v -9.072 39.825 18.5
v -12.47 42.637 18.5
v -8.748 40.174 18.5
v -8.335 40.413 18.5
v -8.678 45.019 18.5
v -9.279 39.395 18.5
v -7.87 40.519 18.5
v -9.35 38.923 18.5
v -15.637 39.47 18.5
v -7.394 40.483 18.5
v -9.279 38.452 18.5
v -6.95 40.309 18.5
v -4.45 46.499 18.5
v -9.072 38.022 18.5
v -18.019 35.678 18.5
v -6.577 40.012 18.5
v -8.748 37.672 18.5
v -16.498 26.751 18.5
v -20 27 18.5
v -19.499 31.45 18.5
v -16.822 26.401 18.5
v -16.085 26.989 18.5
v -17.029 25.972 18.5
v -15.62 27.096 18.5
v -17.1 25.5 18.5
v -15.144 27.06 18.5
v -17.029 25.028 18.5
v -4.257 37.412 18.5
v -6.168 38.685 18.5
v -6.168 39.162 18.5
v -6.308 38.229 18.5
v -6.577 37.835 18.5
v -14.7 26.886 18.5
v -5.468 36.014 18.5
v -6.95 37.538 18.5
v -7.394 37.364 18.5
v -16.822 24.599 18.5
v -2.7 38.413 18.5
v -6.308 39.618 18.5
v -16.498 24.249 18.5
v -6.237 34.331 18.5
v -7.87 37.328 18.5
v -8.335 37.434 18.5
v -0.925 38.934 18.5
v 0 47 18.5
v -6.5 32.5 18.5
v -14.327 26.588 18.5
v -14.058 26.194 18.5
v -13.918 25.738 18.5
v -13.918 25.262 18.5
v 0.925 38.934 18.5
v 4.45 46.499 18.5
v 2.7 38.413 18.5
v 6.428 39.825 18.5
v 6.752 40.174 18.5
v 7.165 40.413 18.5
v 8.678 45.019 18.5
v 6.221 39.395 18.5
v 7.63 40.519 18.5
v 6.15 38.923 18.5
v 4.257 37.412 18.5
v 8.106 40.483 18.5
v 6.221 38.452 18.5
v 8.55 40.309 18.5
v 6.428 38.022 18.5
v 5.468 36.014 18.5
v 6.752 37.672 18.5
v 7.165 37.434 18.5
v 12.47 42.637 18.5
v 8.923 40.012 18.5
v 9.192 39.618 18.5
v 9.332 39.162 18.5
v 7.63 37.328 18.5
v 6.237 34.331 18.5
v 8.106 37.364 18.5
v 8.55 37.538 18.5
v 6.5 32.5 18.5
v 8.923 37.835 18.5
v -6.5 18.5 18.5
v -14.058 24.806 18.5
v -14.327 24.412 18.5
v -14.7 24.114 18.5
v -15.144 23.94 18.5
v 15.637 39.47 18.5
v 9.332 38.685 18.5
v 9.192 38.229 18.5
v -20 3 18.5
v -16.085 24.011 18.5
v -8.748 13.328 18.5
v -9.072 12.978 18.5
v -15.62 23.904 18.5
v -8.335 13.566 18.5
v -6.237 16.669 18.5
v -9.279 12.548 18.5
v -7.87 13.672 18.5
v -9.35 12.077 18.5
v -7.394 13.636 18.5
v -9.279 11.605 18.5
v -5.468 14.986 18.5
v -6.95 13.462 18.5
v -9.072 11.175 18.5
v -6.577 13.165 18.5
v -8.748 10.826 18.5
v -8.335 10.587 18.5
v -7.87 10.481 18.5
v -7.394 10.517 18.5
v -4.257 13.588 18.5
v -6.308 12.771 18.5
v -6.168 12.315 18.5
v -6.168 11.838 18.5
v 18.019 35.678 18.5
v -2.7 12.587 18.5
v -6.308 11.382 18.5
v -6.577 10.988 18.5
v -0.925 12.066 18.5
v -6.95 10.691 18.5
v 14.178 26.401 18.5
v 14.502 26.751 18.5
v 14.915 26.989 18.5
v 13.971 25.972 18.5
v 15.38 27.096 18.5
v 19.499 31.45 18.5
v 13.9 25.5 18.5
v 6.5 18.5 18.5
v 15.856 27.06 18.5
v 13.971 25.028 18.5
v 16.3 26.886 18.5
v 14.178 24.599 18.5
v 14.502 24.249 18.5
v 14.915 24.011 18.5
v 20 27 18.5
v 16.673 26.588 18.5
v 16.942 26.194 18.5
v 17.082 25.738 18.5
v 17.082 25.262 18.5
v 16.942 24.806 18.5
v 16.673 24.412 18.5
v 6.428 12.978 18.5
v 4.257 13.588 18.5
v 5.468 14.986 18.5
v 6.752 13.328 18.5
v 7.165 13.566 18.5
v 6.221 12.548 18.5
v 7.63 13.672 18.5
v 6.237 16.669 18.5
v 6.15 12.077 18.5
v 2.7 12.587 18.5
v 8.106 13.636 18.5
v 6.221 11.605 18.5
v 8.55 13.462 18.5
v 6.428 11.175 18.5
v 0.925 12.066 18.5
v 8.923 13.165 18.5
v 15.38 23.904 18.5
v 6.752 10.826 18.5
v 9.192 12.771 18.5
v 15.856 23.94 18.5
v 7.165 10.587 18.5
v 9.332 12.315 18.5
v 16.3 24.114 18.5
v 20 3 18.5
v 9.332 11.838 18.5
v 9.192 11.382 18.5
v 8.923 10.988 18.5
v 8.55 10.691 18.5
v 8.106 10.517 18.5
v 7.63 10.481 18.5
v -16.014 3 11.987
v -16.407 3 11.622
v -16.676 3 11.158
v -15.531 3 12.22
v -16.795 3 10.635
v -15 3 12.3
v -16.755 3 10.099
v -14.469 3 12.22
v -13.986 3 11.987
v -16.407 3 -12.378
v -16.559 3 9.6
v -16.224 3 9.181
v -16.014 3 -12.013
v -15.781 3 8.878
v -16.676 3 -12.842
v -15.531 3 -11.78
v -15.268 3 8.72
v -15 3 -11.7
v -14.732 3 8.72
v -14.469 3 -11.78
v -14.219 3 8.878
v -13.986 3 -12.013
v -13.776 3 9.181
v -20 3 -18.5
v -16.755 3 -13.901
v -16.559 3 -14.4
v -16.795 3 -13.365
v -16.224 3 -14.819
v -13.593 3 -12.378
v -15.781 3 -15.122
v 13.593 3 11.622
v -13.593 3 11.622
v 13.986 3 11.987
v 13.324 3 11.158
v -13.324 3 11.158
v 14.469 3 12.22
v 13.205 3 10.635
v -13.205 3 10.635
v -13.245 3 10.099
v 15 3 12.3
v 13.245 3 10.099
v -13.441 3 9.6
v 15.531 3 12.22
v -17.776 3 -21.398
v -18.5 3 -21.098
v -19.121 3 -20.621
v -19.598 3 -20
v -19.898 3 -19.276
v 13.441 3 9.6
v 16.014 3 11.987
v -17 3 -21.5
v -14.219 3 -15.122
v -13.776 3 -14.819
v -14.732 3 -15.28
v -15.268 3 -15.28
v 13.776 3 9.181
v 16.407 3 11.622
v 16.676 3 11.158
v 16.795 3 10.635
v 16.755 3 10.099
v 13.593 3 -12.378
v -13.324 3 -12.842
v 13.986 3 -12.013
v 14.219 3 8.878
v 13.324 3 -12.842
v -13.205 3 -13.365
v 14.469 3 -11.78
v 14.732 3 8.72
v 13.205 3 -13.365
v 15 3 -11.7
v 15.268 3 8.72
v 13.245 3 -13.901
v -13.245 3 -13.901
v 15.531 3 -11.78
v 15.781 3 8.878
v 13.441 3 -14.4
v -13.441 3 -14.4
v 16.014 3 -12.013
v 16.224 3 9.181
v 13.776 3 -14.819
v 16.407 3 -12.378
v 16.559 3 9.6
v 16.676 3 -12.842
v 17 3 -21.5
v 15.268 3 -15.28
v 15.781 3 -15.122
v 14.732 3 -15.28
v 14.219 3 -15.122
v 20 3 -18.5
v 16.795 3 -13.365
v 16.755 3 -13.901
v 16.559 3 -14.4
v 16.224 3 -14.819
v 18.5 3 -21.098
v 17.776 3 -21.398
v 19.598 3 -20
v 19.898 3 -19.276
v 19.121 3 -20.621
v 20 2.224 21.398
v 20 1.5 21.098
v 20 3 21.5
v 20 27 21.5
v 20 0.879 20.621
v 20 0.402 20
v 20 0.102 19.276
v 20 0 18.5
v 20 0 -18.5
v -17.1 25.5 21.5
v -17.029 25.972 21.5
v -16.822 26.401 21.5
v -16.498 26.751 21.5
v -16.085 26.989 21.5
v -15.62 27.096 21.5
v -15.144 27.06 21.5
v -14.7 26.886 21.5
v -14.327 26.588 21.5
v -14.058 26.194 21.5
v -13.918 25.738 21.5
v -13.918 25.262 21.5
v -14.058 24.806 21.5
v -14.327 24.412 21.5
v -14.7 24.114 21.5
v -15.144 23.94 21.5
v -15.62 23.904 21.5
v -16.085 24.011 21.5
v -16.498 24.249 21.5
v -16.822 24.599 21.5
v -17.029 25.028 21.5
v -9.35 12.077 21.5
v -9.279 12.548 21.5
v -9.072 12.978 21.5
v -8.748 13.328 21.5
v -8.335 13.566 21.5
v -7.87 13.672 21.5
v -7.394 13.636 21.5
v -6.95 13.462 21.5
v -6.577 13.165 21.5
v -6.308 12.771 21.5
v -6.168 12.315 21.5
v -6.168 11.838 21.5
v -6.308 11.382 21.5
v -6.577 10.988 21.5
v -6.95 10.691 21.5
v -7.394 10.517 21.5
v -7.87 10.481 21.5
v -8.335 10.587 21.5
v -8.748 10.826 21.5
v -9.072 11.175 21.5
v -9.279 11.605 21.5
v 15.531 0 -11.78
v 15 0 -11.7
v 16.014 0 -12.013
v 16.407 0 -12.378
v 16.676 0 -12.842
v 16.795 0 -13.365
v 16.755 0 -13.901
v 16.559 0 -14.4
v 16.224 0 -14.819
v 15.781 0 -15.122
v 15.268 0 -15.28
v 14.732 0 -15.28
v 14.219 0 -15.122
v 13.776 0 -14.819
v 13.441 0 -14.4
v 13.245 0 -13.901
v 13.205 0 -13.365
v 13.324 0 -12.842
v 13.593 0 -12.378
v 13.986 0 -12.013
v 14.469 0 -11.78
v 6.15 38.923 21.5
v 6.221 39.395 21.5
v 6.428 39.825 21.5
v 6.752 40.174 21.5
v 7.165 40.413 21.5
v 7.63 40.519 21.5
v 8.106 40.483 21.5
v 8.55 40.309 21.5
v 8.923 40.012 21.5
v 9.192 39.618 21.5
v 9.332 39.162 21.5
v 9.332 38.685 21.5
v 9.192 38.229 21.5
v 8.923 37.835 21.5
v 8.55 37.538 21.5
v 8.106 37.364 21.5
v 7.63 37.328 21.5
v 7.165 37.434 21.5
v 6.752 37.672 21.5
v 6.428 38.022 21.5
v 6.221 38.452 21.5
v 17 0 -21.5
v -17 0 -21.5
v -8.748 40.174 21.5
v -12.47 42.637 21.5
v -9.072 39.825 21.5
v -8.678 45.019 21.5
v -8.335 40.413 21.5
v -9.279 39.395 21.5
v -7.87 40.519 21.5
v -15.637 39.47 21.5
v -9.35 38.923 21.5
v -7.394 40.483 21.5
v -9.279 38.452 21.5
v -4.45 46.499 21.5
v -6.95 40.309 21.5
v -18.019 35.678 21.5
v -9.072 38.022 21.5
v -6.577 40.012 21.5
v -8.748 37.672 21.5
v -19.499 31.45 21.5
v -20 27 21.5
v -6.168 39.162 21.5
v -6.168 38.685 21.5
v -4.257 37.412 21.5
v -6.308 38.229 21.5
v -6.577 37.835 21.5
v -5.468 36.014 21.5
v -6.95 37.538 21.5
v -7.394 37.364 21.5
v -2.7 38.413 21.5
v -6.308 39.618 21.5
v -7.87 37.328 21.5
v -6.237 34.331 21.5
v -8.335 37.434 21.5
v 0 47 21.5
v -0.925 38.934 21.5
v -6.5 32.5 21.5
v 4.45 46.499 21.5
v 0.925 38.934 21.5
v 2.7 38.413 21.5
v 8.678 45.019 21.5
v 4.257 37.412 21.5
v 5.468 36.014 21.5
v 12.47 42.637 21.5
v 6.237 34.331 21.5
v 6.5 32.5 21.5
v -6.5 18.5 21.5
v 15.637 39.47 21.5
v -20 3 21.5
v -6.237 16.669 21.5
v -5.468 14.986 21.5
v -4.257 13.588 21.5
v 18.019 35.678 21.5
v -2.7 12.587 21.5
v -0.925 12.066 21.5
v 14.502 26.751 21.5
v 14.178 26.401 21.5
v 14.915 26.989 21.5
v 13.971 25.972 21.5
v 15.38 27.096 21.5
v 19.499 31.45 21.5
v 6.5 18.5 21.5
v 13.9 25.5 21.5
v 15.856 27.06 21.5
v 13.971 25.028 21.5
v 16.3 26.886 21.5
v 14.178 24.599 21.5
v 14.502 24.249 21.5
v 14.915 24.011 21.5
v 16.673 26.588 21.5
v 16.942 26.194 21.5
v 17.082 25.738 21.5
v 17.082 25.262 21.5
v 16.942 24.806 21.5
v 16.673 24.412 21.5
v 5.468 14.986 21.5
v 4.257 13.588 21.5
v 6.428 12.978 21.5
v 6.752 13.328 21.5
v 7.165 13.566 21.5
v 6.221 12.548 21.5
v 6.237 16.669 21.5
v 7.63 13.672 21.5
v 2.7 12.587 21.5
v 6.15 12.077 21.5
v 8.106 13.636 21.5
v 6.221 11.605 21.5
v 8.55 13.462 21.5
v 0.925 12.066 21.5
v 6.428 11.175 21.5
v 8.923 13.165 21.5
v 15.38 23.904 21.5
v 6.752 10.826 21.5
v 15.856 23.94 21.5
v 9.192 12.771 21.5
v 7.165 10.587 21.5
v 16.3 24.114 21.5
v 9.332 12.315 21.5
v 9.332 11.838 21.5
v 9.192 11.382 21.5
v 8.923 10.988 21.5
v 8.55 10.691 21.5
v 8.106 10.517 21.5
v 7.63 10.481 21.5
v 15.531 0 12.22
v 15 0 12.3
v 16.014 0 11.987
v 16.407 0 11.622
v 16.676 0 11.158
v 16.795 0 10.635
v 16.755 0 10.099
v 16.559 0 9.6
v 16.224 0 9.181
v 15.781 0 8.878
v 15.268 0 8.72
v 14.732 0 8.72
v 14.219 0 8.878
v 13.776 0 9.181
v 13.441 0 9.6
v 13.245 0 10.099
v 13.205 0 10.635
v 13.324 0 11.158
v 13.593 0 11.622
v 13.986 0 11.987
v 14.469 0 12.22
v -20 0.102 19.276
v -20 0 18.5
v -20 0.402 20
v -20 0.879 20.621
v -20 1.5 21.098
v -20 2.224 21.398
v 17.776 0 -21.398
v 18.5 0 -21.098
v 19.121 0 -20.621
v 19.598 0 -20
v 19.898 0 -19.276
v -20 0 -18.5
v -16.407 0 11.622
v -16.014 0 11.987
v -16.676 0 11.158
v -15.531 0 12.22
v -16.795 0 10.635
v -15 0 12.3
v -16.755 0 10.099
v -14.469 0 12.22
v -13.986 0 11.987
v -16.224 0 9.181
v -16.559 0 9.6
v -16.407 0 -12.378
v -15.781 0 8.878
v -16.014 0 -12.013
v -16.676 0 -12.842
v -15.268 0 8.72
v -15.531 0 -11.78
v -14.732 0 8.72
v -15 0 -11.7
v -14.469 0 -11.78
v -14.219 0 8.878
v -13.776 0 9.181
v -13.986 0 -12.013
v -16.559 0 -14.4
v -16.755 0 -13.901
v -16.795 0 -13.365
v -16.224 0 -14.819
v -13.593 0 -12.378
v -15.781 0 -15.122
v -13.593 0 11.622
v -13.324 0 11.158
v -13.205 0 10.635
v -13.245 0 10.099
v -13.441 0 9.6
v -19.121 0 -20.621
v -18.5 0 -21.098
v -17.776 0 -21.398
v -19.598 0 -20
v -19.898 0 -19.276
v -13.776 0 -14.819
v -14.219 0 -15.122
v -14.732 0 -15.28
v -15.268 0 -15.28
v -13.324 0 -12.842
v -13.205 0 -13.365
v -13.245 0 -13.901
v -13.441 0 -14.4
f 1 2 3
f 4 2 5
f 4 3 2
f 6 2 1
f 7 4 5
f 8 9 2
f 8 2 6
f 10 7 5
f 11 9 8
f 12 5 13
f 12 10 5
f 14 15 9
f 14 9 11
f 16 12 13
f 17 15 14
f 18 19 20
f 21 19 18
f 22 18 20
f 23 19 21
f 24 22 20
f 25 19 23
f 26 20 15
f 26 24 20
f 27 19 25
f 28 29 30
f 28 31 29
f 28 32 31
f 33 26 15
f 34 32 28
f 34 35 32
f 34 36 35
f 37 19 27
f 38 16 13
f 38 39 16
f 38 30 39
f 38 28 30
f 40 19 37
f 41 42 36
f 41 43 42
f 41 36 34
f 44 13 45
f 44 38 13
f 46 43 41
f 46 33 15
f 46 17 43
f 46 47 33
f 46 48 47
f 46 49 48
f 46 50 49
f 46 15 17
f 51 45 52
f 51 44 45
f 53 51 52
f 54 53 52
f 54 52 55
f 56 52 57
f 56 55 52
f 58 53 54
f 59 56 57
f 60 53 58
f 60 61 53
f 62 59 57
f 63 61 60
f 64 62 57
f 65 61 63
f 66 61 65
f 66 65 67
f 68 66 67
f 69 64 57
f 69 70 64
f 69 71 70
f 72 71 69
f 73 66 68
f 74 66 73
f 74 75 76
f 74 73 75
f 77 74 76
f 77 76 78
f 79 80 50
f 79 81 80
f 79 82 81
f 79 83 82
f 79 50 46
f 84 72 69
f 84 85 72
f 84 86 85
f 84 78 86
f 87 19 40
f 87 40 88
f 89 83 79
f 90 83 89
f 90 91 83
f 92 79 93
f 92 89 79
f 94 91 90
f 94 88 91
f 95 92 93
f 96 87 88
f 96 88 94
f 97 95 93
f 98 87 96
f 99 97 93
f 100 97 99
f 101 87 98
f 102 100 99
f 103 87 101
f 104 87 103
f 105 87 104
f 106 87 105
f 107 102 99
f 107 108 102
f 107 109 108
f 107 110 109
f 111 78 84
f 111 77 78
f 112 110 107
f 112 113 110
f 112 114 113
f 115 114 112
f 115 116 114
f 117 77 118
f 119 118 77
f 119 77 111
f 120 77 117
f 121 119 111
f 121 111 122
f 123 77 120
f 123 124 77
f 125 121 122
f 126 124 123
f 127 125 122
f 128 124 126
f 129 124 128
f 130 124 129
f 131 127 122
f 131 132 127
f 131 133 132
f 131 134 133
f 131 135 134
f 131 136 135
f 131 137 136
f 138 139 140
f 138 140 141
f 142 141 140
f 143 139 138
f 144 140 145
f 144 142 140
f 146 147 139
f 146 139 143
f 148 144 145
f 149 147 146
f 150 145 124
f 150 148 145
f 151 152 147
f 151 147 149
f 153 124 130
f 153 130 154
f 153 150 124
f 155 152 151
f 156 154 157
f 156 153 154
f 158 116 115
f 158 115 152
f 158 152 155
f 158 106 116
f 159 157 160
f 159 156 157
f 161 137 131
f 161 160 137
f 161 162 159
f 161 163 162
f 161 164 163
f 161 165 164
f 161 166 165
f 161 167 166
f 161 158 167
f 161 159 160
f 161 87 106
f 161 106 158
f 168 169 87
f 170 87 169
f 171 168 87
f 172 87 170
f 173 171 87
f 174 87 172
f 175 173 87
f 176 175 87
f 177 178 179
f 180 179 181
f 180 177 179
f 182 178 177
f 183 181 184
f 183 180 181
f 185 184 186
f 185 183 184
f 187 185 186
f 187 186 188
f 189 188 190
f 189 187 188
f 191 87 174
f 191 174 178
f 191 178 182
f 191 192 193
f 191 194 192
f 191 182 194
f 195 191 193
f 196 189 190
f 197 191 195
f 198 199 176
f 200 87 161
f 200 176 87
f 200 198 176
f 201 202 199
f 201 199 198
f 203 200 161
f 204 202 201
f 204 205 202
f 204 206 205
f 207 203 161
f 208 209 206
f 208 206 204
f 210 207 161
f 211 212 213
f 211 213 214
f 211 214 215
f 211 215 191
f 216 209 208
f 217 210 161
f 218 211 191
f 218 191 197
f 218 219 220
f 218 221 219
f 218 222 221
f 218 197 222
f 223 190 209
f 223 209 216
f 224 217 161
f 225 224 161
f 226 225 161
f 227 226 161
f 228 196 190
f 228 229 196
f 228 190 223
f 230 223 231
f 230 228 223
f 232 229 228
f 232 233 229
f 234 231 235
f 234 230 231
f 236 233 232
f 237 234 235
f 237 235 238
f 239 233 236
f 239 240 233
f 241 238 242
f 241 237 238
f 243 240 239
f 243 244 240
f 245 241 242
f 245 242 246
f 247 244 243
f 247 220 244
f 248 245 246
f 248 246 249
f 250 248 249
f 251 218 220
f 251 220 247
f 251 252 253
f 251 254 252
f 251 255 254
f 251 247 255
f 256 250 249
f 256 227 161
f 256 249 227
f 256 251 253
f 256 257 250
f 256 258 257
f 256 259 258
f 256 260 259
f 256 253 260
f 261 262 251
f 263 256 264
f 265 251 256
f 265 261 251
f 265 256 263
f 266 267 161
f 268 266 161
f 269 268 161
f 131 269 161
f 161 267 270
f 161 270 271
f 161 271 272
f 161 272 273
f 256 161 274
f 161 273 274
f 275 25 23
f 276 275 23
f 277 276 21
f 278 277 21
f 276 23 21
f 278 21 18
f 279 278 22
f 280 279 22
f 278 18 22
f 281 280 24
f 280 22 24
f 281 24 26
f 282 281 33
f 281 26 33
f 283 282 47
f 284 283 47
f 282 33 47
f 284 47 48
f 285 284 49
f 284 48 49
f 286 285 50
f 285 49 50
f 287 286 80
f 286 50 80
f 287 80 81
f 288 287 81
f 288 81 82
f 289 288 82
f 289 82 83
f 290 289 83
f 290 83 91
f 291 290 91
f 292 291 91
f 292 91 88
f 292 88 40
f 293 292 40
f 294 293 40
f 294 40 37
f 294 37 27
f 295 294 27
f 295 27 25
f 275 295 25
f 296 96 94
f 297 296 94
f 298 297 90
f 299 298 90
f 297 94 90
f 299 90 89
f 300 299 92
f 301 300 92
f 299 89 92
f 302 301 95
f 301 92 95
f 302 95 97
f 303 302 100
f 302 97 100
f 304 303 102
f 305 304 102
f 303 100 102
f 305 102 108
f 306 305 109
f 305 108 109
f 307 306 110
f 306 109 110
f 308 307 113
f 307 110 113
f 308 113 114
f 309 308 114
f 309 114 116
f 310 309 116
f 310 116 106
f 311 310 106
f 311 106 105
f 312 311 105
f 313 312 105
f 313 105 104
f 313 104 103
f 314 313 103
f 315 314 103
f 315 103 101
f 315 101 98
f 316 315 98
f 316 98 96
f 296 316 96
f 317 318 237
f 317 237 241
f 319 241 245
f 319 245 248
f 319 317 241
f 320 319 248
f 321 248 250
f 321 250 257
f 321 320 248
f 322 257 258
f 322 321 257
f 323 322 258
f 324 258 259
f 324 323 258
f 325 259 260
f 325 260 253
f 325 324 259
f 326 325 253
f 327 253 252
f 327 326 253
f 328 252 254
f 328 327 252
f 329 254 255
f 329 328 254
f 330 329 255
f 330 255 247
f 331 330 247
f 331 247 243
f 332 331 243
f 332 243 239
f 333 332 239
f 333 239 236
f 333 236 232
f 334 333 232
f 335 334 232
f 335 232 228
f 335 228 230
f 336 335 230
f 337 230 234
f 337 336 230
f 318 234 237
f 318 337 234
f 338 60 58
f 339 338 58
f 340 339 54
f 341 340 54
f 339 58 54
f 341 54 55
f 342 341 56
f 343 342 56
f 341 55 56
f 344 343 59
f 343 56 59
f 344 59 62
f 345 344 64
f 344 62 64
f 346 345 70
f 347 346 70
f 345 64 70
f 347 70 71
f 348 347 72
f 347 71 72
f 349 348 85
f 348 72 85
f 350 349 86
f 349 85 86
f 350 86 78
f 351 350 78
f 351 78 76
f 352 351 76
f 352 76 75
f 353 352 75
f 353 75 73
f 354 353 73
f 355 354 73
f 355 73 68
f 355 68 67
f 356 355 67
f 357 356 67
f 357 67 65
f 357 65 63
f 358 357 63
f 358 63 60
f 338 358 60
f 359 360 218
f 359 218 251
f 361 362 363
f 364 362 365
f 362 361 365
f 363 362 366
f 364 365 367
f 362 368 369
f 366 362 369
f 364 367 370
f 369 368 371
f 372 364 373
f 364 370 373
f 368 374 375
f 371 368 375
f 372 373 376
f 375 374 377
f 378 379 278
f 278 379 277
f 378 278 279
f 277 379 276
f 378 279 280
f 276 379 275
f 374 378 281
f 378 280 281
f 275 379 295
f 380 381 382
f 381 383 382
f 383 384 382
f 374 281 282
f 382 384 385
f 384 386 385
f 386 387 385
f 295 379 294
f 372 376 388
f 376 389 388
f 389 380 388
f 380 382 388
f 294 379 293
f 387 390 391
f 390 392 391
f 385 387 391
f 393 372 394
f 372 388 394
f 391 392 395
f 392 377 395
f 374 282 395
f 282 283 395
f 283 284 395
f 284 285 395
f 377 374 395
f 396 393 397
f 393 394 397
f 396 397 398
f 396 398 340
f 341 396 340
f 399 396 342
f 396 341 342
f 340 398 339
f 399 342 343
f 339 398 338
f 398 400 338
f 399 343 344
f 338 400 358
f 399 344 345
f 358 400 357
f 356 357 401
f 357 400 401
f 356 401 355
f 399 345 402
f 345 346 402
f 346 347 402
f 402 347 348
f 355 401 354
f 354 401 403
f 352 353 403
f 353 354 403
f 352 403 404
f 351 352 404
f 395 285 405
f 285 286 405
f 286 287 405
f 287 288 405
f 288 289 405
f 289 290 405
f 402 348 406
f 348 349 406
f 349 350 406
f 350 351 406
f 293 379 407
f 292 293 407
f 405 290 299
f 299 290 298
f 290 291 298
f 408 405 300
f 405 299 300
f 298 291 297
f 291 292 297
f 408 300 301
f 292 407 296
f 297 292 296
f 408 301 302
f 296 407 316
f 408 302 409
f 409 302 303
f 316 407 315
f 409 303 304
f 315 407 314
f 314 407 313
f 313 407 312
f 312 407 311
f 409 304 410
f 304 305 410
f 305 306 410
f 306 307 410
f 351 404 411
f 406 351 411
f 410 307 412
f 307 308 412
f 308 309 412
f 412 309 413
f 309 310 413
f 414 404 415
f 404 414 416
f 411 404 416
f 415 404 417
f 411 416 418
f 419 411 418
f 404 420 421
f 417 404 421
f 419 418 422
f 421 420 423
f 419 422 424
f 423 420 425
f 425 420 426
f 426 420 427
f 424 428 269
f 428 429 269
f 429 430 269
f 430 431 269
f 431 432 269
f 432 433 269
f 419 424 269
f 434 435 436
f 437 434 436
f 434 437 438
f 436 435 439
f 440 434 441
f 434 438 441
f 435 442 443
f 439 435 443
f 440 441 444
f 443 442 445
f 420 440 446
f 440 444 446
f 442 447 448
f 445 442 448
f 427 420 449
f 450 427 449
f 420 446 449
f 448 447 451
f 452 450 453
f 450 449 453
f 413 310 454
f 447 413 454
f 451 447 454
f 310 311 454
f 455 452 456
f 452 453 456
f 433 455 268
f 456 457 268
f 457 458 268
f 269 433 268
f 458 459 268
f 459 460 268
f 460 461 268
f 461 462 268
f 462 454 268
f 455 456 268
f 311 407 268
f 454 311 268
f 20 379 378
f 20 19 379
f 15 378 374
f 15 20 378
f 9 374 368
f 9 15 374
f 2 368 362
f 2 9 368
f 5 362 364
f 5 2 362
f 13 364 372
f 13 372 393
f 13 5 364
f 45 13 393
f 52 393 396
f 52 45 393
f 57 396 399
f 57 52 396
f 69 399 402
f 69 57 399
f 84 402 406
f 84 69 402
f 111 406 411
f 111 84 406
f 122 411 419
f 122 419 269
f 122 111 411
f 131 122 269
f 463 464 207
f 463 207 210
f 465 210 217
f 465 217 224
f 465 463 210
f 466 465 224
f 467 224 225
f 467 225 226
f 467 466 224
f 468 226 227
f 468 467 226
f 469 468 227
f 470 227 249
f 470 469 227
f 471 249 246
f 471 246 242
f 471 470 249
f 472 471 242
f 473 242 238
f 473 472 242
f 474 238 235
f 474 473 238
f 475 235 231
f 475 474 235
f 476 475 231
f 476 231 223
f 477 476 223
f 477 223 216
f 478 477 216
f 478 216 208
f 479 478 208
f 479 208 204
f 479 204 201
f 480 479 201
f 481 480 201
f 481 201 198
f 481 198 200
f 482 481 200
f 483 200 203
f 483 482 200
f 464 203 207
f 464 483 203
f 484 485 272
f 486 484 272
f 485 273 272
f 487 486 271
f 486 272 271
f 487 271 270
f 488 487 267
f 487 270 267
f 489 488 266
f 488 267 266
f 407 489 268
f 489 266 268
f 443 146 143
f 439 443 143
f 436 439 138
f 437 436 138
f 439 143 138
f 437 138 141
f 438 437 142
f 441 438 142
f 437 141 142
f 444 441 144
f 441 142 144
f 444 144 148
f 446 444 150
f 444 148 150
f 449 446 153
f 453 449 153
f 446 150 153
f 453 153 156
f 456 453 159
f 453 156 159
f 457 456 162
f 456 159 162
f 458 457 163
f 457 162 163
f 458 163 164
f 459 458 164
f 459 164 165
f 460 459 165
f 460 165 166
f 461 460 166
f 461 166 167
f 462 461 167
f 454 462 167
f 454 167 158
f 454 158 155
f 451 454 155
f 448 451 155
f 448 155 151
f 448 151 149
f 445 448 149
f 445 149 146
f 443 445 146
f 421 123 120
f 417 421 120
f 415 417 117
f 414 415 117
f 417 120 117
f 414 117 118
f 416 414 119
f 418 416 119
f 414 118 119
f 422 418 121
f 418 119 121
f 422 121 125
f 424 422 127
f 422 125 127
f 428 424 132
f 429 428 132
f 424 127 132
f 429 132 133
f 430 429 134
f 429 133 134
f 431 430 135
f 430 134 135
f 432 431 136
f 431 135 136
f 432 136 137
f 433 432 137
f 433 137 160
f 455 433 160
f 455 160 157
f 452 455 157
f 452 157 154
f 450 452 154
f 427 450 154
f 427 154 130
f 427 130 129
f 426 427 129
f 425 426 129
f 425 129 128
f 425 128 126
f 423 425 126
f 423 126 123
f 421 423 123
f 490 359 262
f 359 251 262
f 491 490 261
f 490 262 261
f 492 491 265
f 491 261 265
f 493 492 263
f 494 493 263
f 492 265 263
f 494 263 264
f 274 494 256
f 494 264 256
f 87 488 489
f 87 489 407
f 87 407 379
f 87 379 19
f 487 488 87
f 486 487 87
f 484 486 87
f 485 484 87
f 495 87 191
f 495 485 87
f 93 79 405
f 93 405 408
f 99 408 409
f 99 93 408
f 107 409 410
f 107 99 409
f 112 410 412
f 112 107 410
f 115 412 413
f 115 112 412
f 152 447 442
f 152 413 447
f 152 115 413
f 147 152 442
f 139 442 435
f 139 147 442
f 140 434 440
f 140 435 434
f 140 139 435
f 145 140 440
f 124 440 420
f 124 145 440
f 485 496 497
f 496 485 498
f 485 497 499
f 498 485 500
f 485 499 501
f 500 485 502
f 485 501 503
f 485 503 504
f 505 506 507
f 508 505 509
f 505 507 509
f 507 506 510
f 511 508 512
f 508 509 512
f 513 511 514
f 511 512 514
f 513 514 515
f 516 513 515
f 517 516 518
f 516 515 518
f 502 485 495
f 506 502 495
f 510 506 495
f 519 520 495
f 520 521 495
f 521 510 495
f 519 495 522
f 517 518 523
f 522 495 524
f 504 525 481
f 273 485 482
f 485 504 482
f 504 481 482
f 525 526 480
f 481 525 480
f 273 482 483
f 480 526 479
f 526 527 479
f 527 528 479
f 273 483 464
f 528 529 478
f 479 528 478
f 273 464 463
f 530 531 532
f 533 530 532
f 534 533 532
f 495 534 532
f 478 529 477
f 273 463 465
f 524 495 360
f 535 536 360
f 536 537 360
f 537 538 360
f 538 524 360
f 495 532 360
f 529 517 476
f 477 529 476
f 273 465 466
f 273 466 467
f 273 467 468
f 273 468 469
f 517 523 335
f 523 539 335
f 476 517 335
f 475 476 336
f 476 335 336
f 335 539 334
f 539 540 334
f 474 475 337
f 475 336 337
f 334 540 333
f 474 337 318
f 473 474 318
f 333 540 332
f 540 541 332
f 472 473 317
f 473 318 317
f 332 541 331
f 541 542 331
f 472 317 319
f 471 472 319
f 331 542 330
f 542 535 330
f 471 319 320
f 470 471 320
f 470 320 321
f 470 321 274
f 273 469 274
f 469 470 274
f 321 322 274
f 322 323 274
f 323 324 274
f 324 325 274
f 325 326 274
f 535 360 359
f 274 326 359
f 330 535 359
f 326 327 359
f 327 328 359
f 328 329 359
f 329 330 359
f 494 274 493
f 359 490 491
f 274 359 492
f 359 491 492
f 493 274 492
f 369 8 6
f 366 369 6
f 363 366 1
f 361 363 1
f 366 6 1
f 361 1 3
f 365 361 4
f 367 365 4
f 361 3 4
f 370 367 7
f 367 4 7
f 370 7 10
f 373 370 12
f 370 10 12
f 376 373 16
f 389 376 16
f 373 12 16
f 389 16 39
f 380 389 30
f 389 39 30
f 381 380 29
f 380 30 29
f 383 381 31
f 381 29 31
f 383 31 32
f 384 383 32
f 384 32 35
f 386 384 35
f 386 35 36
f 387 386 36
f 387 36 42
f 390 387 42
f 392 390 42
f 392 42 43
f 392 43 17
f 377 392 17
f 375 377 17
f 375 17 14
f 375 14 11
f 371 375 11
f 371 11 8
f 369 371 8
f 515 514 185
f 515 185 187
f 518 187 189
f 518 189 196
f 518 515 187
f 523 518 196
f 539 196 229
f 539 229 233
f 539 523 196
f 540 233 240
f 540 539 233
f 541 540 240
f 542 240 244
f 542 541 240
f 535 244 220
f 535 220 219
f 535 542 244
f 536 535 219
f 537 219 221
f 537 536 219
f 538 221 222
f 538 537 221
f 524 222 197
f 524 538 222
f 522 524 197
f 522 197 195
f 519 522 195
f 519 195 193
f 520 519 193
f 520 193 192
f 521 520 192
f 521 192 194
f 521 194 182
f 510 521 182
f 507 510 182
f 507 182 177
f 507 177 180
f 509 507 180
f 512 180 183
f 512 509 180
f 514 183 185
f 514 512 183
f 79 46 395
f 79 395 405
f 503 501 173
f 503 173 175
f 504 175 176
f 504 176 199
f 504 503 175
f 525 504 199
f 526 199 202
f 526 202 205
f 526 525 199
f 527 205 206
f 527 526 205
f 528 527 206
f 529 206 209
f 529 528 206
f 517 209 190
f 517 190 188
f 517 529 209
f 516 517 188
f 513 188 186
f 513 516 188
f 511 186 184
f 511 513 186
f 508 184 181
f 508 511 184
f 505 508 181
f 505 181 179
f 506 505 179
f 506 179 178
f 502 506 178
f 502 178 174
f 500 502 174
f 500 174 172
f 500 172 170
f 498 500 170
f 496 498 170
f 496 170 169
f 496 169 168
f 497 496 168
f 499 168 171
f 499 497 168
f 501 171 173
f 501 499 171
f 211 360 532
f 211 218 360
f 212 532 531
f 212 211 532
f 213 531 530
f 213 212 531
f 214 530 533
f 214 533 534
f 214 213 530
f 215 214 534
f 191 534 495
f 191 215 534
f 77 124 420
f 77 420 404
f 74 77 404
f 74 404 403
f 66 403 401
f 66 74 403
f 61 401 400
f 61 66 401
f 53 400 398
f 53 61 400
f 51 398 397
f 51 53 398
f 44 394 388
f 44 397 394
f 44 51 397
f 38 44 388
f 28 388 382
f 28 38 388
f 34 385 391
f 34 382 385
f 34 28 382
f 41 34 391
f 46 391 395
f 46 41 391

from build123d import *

# Parameters (mm, degrees)
SKETCH_1_W          = 40
SKETCH_1_H          = 43
SKETCH_1_R          = 1.8
EXTRUDE_1_DEPTH     = 3
SKETCH_2_W          = 40
SKETCH_2_H          = 3
EXTRUDE_2_DEPTH     = 44
SKETCH_3_R          = 1.6
CUT_EXTRUDE_1_DEPTH = 44
FILLET_1_R          = 20
FILLET_2_R          = 3
FILLET_3_R          = 3
FILLET_4_R          = 3


with BuildPart() as part:
    # 草图1 → 凸台-拉伸1 (new body)
    with BuildSketch(Plane(origin=(0, 0, 0), x_dir=(1, 0, 0), z_dir=(0, 1, 0))):
        Rectangle(SKETCH_1_W, SKETCH_1_H)
        with Locations(Location((-15, 13.5, 0), (0, 0, 270))):
            Circle(SKETCH_1_R, mode=Mode.SUBTRACT)
        with Locations(Location((15, 13.5, 0), (0, 0, 270))):
            Circle(SKETCH_1_R, mode=Mode.SUBTRACT)
        with Locations(Location((15, -10.5, 0), (0, 0, 270))):
            Circle(SKETCH_1_R, mode=Mode.SUBTRACT)
        with Locations(Location((-15, -10.5, 0), (0, 0, 270))):
            Circle(SKETCH_1_R, mode=Mode.SUBTRACT)
    extrude(amount=EXTRUDE_1_DEPTH)

    # 草图2 → 凸台-拉伸2 (add)
    with BuildSketch(Plane(origin=(0, 3, 0), x_dir=(1, 0, 0), z_dir=(0, 1, 0))):
        with Locations((0, -20)):
            Rectangle(SKETCH_2_W, SKETCH_2_H)
    extrude(amount=EXTRUDE_2_DEPTH)

    # 草图3 → 切除-拉伸1 (cut)
    with BuildSketch(Plane(origin=(0, 0, 18.5), x_dir=(-1, 0, 0), z_dir=(0, 0, -1))):
        with Locations((15.5, 25.5)):
            Circle(SKETCH_3_R)
        with Locations((-15.5, 25.5)):
            Circle(SKETCH_3_R)
        with Locations((-7.75, 38.923393759)):
            Circle(SKETCH_3_R)
        with Locations((-7.75, 12.076606241)):
            Circle(SKETCH_3_R)
        with Locations((7.75, 12.076606241)):
            Circle(SKETCH_3_R)
        with Locations((7.75, 38.923393759)):
            Circle(SKETCH_3_R)
        with BuildLine():
            Line((6.5, 32.5), (6.5, 18.5))
            ThreePointArc((6.5, 18.5), (0, 12), (-6.5, 18.5))
            Line((-6.5, 18.5), (-6.5, 32.5))
            ThreePointArc((-6.5, 32.5), (0, 39), (6.5, 32.5))
        make_face()
    extrude(amount=-CUT_EXTRUDE_1_DEPTH, mode=Mode.SUBTRACT)

    # 圆角1
    fillet_1_edges = [part.edges().sort_by_distance(p)[0] for p in [
        (-20, 47, 20),
        (20, 47, 20),
    ]]
    fillet(fillet_1_edges, radius=FILLET_1_R - 0.0001)  # a hair under: the kernel refuses the full size

    # 圆角2
    fillet_2_edges = [part.edges().sort_by_distance(p)[0] for p in [
        (20, 1.5, -21.5),
    ]]
    fillet(fillet_2_edges, radius=FILLET_2_R)

    # 圆角3
    fillet_3_edges = [part.edges().sort_by_distance(p)[0] for p in [
        (-20, 1.5, -21.5),
    ]]
    fillet(fillet_3_edges, radius=FILLET_3_R)

    # 圆角4
    fillet_4_edges = [part.edges().sort_by_distance(p)[0] for p in [
        (0, 0, 21.5),
    ]]
    fillet(fillet_4_edges, radius=FILLET_4_R)


solid = part.part
